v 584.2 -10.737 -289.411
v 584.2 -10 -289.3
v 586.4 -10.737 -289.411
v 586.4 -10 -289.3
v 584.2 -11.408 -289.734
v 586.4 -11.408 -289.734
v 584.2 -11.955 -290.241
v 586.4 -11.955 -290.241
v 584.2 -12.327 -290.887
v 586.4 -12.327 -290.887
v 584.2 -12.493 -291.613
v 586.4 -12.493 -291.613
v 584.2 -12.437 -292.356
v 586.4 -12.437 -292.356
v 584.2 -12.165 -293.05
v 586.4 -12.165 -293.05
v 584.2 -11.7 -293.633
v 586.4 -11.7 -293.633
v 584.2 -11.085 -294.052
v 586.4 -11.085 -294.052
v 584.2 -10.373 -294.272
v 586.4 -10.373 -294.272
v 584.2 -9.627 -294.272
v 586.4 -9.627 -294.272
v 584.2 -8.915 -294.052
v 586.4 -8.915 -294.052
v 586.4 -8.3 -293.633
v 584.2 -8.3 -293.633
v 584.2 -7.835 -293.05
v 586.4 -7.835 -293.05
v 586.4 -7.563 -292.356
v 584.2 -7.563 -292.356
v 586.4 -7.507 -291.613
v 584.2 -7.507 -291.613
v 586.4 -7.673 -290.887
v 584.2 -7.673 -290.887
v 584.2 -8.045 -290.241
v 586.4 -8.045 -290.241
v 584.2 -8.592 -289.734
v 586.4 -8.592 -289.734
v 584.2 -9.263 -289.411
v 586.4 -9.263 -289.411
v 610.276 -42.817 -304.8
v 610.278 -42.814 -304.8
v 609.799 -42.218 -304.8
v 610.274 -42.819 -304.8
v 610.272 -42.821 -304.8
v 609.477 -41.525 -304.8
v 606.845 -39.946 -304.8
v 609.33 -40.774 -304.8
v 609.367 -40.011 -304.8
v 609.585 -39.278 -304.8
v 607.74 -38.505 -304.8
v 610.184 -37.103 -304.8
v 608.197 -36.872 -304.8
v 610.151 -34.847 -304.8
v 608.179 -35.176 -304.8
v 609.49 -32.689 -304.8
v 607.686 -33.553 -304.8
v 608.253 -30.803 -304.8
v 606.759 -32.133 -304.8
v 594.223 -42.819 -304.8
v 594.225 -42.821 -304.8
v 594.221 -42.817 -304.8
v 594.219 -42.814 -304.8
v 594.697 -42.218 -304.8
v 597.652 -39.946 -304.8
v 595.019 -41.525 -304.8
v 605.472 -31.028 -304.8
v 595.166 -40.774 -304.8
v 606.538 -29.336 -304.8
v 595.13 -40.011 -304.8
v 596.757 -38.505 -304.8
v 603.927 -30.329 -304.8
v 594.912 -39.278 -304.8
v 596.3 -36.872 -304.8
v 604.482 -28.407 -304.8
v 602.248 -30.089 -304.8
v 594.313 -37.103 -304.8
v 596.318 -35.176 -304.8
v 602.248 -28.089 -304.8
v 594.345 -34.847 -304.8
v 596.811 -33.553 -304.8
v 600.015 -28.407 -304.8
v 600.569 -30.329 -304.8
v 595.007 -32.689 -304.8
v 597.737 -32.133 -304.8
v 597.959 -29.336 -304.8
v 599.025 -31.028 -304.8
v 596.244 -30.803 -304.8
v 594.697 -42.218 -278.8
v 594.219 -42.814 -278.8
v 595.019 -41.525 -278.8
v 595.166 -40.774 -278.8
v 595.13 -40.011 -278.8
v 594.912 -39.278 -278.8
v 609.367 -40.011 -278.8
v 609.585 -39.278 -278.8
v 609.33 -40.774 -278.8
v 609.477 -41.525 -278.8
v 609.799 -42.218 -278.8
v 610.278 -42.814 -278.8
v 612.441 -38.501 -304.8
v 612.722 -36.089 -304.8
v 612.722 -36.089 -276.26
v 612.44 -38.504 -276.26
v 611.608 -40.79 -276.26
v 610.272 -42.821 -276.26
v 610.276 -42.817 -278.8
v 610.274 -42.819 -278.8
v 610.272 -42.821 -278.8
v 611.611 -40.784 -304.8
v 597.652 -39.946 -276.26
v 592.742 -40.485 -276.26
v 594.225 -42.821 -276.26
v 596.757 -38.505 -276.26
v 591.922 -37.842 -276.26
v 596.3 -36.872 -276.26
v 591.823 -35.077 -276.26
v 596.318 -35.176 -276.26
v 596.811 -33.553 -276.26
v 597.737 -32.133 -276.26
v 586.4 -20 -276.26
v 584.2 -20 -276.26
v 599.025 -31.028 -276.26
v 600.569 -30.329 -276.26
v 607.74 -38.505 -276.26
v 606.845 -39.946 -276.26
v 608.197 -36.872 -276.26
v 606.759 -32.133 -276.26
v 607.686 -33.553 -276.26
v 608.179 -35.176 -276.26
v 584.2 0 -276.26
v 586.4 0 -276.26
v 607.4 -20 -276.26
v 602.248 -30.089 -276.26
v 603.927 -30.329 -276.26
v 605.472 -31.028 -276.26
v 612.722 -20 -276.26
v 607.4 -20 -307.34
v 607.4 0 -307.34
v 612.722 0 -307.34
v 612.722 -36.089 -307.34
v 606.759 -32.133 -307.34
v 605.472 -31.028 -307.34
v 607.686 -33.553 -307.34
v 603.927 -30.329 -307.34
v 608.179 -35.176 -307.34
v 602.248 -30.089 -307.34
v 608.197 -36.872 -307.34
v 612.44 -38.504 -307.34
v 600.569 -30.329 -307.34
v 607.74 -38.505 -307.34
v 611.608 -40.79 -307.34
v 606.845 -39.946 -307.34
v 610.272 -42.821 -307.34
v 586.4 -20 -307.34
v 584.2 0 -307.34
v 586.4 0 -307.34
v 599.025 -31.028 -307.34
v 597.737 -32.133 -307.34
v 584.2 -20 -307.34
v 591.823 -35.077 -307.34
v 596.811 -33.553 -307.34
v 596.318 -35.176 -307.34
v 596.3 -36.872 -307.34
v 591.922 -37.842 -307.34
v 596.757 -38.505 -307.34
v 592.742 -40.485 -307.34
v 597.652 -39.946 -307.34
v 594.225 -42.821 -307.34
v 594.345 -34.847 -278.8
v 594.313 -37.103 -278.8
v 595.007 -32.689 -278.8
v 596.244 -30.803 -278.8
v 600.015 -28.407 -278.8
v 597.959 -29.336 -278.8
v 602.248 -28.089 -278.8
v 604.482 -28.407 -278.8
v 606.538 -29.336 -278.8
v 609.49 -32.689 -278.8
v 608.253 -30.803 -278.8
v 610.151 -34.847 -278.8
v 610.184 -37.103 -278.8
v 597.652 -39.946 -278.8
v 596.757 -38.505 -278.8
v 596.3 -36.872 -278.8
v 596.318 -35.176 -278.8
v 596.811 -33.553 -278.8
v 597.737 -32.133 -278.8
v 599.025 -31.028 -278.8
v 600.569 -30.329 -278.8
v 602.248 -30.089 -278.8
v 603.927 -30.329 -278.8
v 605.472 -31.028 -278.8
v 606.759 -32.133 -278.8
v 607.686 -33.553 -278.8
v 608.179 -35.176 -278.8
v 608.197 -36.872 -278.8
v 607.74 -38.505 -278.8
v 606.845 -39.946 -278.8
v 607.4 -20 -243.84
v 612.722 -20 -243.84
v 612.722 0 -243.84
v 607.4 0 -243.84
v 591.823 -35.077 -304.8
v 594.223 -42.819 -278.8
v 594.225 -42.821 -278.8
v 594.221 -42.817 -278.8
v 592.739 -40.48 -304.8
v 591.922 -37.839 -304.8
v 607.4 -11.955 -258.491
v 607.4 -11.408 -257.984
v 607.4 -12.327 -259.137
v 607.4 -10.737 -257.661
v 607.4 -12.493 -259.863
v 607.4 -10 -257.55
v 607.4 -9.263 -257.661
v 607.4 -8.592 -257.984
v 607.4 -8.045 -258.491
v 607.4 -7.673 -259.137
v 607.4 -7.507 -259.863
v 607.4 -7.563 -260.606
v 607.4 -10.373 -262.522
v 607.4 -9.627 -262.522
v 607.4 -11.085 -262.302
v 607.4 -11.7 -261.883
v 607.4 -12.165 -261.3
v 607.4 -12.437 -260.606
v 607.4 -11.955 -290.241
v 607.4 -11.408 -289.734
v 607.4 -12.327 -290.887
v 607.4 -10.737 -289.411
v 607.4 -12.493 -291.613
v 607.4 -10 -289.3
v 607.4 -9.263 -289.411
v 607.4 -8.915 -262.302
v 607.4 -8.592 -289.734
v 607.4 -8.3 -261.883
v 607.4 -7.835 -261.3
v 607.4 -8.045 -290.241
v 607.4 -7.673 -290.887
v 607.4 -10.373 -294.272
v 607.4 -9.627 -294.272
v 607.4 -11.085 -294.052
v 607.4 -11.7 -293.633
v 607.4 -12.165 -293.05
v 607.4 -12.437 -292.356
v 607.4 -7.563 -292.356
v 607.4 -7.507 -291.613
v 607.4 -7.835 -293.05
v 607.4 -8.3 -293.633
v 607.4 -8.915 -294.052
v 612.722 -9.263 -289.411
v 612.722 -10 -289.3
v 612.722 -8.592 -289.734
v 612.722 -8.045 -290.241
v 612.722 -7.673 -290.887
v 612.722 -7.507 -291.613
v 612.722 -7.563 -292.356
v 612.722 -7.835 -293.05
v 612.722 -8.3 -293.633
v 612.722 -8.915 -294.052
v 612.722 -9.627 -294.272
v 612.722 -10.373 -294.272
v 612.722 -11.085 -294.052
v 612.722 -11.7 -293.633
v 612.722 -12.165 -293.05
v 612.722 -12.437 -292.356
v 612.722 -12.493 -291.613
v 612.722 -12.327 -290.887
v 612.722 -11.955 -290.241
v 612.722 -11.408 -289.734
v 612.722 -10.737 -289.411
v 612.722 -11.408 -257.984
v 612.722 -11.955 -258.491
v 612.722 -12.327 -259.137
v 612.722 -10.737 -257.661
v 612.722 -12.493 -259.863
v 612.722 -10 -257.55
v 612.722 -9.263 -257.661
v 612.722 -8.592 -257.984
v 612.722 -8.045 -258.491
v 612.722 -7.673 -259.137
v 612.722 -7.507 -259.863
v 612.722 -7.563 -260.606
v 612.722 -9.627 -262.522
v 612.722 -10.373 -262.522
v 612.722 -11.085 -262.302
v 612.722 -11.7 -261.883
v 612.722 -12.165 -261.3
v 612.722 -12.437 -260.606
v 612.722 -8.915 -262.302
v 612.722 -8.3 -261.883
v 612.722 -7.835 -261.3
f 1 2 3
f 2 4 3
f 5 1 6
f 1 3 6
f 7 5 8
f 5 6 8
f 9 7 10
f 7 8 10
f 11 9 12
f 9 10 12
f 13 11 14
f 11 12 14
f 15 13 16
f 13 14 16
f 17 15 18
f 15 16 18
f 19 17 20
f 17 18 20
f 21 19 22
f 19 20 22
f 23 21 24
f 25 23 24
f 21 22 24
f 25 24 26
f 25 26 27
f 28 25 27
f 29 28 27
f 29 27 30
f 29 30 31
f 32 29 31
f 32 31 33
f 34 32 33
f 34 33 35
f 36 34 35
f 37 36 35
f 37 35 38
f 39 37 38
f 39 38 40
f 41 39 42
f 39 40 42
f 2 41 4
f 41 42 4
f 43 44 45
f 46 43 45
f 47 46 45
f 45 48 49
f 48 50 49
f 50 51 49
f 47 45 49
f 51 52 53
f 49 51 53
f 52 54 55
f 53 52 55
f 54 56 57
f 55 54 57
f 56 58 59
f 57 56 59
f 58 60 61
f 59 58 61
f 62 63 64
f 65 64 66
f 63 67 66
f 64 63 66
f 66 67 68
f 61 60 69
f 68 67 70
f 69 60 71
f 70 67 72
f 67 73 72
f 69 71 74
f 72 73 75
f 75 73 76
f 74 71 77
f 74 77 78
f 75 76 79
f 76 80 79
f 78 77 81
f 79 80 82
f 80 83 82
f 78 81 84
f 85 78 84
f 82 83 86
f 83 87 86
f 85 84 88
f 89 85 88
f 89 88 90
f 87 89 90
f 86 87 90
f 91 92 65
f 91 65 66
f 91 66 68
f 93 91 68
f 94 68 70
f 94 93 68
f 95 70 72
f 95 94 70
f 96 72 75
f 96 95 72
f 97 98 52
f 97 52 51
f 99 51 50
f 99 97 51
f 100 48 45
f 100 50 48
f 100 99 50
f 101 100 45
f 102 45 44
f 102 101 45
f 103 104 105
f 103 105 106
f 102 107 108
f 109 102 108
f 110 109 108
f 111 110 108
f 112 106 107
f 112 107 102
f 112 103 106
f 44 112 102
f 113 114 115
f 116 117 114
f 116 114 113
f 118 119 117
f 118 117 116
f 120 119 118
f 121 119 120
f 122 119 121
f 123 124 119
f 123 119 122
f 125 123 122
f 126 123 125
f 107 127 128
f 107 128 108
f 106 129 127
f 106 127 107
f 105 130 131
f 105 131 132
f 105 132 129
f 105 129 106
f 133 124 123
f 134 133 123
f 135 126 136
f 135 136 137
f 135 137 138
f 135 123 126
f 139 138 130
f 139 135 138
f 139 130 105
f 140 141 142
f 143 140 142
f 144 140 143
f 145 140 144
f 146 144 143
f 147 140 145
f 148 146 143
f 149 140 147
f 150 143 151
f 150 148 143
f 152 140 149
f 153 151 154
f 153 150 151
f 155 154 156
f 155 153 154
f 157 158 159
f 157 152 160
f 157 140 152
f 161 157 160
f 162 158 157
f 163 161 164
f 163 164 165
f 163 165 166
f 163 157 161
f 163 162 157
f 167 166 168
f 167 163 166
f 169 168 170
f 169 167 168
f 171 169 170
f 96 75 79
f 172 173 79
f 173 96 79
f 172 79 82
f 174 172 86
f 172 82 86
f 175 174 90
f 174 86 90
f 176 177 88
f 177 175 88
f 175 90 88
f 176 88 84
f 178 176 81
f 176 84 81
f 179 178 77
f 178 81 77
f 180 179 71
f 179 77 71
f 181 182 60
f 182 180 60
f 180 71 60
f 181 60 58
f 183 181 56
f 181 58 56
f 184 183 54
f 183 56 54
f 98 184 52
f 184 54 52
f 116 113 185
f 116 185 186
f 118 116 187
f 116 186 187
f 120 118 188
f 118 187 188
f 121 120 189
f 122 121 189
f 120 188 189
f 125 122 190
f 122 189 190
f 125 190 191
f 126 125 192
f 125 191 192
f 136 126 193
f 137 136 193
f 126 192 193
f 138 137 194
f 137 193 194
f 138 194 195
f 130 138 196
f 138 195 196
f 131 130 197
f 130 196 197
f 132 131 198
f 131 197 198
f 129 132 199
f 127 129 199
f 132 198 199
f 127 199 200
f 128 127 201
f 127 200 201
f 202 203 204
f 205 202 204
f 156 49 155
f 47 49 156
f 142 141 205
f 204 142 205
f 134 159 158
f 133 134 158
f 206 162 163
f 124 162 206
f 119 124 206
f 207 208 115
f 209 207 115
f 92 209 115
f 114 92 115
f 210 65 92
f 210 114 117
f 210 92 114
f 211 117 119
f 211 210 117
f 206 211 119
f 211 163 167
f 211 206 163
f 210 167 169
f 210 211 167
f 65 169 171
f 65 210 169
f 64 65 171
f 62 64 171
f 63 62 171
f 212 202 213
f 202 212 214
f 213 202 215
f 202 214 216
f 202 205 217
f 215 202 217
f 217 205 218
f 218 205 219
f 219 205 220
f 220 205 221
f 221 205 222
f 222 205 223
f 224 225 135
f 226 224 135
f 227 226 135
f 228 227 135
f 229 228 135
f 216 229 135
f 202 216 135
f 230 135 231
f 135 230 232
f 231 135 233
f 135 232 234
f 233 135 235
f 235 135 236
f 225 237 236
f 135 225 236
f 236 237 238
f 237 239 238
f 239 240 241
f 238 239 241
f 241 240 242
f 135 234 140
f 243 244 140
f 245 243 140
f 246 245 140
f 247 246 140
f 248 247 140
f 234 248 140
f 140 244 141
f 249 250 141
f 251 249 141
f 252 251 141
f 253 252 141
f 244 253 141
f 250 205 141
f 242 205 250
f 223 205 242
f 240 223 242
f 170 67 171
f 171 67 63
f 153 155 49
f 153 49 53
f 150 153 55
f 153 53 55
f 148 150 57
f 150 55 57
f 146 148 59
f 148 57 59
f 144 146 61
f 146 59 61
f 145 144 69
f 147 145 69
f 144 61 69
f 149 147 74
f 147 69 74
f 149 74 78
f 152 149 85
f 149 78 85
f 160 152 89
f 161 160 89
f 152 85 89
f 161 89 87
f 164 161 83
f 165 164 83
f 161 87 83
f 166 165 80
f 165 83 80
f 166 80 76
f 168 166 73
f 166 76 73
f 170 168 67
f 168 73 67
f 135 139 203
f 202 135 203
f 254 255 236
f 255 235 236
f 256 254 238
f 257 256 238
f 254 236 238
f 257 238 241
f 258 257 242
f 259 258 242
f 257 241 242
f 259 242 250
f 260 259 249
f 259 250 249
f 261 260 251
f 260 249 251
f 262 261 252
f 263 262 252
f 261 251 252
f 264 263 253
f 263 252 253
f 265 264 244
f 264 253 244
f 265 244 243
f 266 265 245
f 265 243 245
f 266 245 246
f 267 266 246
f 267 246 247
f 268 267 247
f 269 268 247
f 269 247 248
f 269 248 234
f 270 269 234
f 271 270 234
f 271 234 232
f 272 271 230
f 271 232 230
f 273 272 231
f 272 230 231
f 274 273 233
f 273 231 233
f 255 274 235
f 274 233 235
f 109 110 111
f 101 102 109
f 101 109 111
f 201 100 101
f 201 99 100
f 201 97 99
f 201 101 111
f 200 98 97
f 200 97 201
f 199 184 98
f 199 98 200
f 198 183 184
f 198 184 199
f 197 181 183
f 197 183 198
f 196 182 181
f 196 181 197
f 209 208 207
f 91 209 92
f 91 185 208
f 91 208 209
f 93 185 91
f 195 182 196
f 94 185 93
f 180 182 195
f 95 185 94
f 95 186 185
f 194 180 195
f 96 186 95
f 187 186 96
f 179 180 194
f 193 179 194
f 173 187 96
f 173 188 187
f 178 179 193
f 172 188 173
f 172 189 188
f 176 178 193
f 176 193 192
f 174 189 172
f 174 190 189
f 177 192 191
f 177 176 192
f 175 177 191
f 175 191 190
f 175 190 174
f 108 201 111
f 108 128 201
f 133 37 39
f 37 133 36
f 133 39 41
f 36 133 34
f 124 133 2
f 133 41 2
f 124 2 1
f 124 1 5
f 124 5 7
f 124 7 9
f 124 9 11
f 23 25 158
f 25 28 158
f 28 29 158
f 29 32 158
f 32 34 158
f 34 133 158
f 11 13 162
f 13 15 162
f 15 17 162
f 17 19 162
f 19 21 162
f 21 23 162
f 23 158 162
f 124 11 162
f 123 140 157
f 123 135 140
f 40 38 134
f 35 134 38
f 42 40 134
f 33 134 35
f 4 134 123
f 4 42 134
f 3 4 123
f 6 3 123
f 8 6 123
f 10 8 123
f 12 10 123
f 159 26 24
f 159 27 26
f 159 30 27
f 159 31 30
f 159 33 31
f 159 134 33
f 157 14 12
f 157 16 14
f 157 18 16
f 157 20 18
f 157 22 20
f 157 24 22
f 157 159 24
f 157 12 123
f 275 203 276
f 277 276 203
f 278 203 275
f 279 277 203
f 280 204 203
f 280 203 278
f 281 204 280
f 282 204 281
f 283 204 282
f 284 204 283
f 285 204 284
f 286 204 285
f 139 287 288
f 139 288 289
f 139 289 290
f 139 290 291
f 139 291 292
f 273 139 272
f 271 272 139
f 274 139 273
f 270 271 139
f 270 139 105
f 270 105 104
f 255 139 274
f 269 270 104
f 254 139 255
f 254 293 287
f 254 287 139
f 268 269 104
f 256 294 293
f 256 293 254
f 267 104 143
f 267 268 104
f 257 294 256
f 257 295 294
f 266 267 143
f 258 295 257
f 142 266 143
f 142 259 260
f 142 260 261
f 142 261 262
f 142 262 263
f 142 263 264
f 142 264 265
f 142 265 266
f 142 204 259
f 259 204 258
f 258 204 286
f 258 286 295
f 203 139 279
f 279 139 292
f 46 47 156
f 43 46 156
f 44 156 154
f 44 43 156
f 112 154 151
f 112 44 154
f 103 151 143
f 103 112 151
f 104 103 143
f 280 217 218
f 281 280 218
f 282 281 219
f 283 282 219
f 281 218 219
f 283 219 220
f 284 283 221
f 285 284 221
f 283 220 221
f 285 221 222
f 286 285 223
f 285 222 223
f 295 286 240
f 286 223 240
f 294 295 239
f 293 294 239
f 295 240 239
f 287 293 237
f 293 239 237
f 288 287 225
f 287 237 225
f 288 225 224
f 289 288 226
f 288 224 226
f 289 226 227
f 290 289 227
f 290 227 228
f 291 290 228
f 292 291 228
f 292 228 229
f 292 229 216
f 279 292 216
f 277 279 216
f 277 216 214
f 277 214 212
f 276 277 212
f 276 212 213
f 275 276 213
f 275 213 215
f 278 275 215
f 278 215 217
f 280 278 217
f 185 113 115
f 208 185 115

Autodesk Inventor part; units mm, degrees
ref_plane "YZ Plane" through (0, 0, 0) normal (1, 0, 0) x (0, 1, 0)
ref_plane "XZ Plane" through (0, 0, 0) normal (0, 1, 0) x (-1, 0, 0)
ref_plane "XY Plane" through (0, 0, 0) normal (0, 0, 1) x (1, 0, 0)
ref_plane "Work Plane1" through (0, 0, -304.8) normal (0, 0, 1) x (1, 0, 0)
sketch "Sketch1" plane through (0, 0, -304.8) normal (0, 0, 1) x (1, 0, 0)
  circle A0 centre (602.2484, -36.0888) radius 4 projected
  line L0 (25.4, 0) -> (584.2, 0) projected
  line L1 (584.2, 0) -> (584.2, -20) projected
  line L2 (609.6, -20) -> (584.2, -20) projected
  line L3 (609.6, -20) -> (609.6, 3.175) projected
  line L4 (0, 3.175) -> (609.6, 3.175) projected
  line L5 (0, -20) -> (0, 3.175) projected
  line L6 (25.4, -20) -> (0, -20) projected
  line L7 (25.4, 0) -> (25.4, -20) projected
  circle A1 centre (602.2484, -36.0888) radius 8
  line L8 (595.3202, -40.0888) -> (593.5242, -41.8849)
  line L9 (595.3202, -40.0888) -> (597.8602, -40.0888) construction
  arc A2 (591.8233, -35.0767) -> (612.7225, -36.0888) centre (602.2484, -36.0888) ccw
  line L10 (609.6, -20) -> (584.2, -20)
  line L11 (586.9, -20) -> (606.9, -20)
  line L12 (612.7225, -20) -> (609.6, -20)
  line L13 (612.7225, -36.0888) -> (612.7225, -20)
  line L14 (584.2, -20) -> (591.8233, -35.0767)
  point P0 (0, 0)
  dimension "d0" = 16
  dimension "d1" = 2.54
  dimension "d2" = 135
  dimension "d3" = 20
extrude "Extrusion1" add sketch "Sketch1" along normal blind 26 contours L2 L12 L13 A2 L14
sketch "Sketch2" plane through (0, 0, -278.8) normal (0, 0, 1) x (1, 0, 0)
  circle A0 centre (602.2484, -36.0888) radius 8 projected
  line L0 (584.2, -20) -> (591.8233, -35.0767) projected
  arc A1 (591.8233, -35.0767) -> (612.7225, -36.0888) centre (602.2484, -36.0888) ccw projected
  line L1 (612.7225, -36.0888) -> (612.7225, -20) projected
  line L2 (612.7225, -20) -> (584.2, -20) projected
  circle A2 centre (602.2484, -36.0888) radius 6
  point P0 (0, 0)
  dimension "d7" = 12
extrude "Extrusion2" add sketch "Sketch2" along normal blind 2.54 contours A0 | L2 L1 A1 L0
sketch "Sketch3" plane through (0, 0, -304.8) normal (0, 0, -1) x (-1, 0, 0)
  circle A0 centre (-602.2484, -36.0888) radius 6 projected
  line L0 (-584.2, -20) -> (-591.8233, -35.0767) projected
  arc A1 (-612.7225, -36.0888) -> (-591.8233, -35.0767) centre (-602.2484, -36.0888) ccw projected
  line L1 (-612.7225, -36.0888) -> (-612.7225, -20) projected
  line L2 (-612.7225, -20) -> (-584.2, -20) projected
  point P0 (0, 0)
extrude "Extrusion3" add sketch "Sketch3" along normal blind 2.54
sketch "Sketch4" plane through (0, 0, -276.26) normal (0, 0, 1) x (1, 0, 0)
  circle A0 centre (602.2484, -36.0888) radius 6 projected
  line L0 (584.2, -20) -> (591.8233, -35.0767) projected
  arc A1 (591.8233, -35.0767) -> (612.7225, -36.0888) centre (602.2484, -36.0888) ccw projected
  line L1 (612.7225, -36.0888) -> (612.7225, -20) projected
  line L2 (612.7225, -20) -> (584.2, -20) projected
  line L3 (602.2484, -36.0888) -> (610.272, -42.8214)
  arc A2 (591.8233, -35.0767) -> (612.7225, -36.0888) centre (602.2484, -36.0888) ccw projected
  line L4 (602.2484, -36.0888) -> (612.7225, -36.0888) construction
  circle A3 centre (602.2484, -36.0888) radius 6 projected
  line L5 (602.2484, -36.0888) -> (594.2248, -42.8214)
  line L6 (602.2484, -36.0888) -> (612.7225, -36.0888) construction
  arc A4 (594.2248, -42.8214) -> (610.272, -42.8214) centre (602.2484, -36.0888) ccw
  line L7 (602.2484, -36.0888) -> (594.2248, -42.8214)
  line L8 (602.2484, -36.0888) -> (610.272, -42.8214)
  point P0 (0, 0)
  dimension "d12" = 40
  dimension "d13" = 140
extrude "Extrusion4" cut sketch "Sketch4" against normal blind 39.0525 contours L5 L3 A0 | A0 L3 A1 L5 picked at (604.1466, -39.5744)
fillet "Fillet1" radius 3.175 2 edges at (596.1201, -41.2311, -291.8) (608.3768, -41.2311, -291.8)
sketch "Sketch5" plane through (0, 0, -276.26) normal (0, 0, 1) x (1, 0, 0)
  point P0 (0, 0)
sketch "Sketch6" plane through (0, 0, -307.34) normal (0, 0, -1) x (-1, 0, 0)
  point P0 (0, 0)
sketch "Sketch7" plane through (0, 0, -307.34) normal (0, 0, -1) x (-1, 0, 0)
  line L0 (-25.4, 0) -> (-584.2, 0) projected
  line L1 (-584.2, 0) -> (-584.2, -20) projected
  line L2 (-609.6, -20) -> (-584.2, -20) projected
  line L3 (-609.6, -20) -> (-609.6, 3.175) projected
  line L4 (0, 3.175) -> (-609.6, 3.175) projected
  line L5 (0, -20) -> (0, 3.175) projected
  line L6 (-25.4, -20) -> (0, -20) projected
  line L7 (-25.4, 0) -> (-25.4, -20) projected
  line L8 (-606.8447, -39.9455) -> (-610.272, -42.8214) projected
  arc A0 (-612.7225, -36.0888) -> (-610.272, -42.8214) centre (-602.2484, -36.0888) ccw projected
  line L9 (-612.7225, -36.0888) -> (-612.7225, -20) projected
  line L10 (-612.7225, -20) -> (-584.2, -20) projected
  line L11 (-584.2, -20) -> (-591.8233, -35.0767) projected
  arc A1 (-594.2248, -42.8214) -> (-591.8233, -35.0767) centre (-602.2484, -36.0888) ccw projected
  line L12 (-594.2248, -42.8214) -> (-597.6521, -39.9455) projected
  arc A2 (-597.6521, -39.9455) -> (-606.8447, -39.9455) centre (-602.2484, -36.0888) ccw projected
  line L13 (-586.4, 0) -> (-586.4, -20)
  line L14 (-607.4, -20) -> (-607.4, 0)
  line L15 (-586.4, 0) -> (-584.2, 0)
  line L16 (-584.2, 0) -> (-584.2, -20)
  line L17 (-584.2, -20) -> (-586.4, -20)
  line L18 (-586.4, 0) -> (-586.4, -20)
  line L19 (-607.4, 0) -> (-609.6, 0)
  line L20 (-609.6, 0) -> (-609.6, -20)
  line L21 (-609.6, -20) -> (-607.4, -20)
  point P0 (0, 0)
  dimension "d17" = 21
  dimension "d18" = 20
extrude "Extrusion5" add sketch "Sketch7" against normal up to surface (31.08 mm away) contours L1 L2 L13 L15 | L2 L3 L19 L14
sketch "Sketch8" plane through (609.6, -20, -307.34) normal (1, 0, 0) x (0, 0, -1)
  line L0 (-31.08, 20) -> (-31.08, 0) projected
  line L1 (0, 0) -> (-31.08, 0) projected
  line L2 (0, 20) -> (0, 0) projected
  line L3 (0, 20) -> (-31.08, 20) projected
  point P0 (-307.34, 20)
extrude "Extrusion6" add sketch "Sketch8" along normal up to surface (3.1225 mm away)
sketch "Sketch9" plane through (612.7225, -36.0888, -276.26) normal (1, 0, 0) x (0, 0, -1)
  line L0 (0, -3.8567) -> (0, -6.7326) projected
  line L1 (0, -6.7326) -> (0, 0) projected
  line L2 (0, 0) -> (0, 36.0888) projected
  line L3 (0, 16.0888) -> (0, 36.0888) projected
  line L4 (0, 36.0888) -> (0, 16.0888) projected
  line L5 (0, 16.0888) -> (0, 36.0888) projected
  line L6 (0, 16.0888) -> (0, 1.0121) projected
  line L7 (0, 1.0121) -> (0, -6.7326) projected
  line L8 (0, -6.7326) -> (0, -3.8567) projected
  line L9 (0, -3.8567) -> (0, -3.8567) projected
  line L10 (31.08, 16.0888) -> (0, 16.0888) projected
  line L11 (31.08, 16.0888) -> (-32.42, 16.0888)
  line L12 (-32.42, 16.0888) -> (-32.42, 36.0888)
  line L13 (-32.42, 36.0888) -> (31.08, 36.0888)
  line L14 (31.08, 36.0888) -> (31.08, 16.0888)
  point P0 (-276.26, 36.0888)
  dimension "d23" = 63.5
  dimension "d24" = 20
extrude "Extrusion7" add sketch "Sketch9" against normal up to surface (5.3225 mm away)
sketch "Sketch10" plane through (607.4, -20, -307.34) normal (-1, 0, 0) x (0, 0, 1)
  line L0 (31.08, -16.0888) -> (31.08, 0) projected
  line L1 (0, -16.0888) -> (31.08, -16.0888) projected
  line L2 (0, 20) -> (0, -16.0888) projected
  line L3 (63.5, 20) -> (0, 20) projected
  line L4 (63.5, 20) -> (63.5, 0) projected
  line L5 (63.5, 0) -> (31.08, 0) projected
  circle A0 centre (47.29, 10) radius 2.5
  circle A1 centre (15.54, 10) radius 2.5
  point P0 (307.34, 20)
  dimension "d27" = 5
  dimension "d28" = 5
extrude "Extrusion8" cut sketch "Sketch10" along normal mid plane 254 contours A0 | A1
properties part number "Bed Slider"
